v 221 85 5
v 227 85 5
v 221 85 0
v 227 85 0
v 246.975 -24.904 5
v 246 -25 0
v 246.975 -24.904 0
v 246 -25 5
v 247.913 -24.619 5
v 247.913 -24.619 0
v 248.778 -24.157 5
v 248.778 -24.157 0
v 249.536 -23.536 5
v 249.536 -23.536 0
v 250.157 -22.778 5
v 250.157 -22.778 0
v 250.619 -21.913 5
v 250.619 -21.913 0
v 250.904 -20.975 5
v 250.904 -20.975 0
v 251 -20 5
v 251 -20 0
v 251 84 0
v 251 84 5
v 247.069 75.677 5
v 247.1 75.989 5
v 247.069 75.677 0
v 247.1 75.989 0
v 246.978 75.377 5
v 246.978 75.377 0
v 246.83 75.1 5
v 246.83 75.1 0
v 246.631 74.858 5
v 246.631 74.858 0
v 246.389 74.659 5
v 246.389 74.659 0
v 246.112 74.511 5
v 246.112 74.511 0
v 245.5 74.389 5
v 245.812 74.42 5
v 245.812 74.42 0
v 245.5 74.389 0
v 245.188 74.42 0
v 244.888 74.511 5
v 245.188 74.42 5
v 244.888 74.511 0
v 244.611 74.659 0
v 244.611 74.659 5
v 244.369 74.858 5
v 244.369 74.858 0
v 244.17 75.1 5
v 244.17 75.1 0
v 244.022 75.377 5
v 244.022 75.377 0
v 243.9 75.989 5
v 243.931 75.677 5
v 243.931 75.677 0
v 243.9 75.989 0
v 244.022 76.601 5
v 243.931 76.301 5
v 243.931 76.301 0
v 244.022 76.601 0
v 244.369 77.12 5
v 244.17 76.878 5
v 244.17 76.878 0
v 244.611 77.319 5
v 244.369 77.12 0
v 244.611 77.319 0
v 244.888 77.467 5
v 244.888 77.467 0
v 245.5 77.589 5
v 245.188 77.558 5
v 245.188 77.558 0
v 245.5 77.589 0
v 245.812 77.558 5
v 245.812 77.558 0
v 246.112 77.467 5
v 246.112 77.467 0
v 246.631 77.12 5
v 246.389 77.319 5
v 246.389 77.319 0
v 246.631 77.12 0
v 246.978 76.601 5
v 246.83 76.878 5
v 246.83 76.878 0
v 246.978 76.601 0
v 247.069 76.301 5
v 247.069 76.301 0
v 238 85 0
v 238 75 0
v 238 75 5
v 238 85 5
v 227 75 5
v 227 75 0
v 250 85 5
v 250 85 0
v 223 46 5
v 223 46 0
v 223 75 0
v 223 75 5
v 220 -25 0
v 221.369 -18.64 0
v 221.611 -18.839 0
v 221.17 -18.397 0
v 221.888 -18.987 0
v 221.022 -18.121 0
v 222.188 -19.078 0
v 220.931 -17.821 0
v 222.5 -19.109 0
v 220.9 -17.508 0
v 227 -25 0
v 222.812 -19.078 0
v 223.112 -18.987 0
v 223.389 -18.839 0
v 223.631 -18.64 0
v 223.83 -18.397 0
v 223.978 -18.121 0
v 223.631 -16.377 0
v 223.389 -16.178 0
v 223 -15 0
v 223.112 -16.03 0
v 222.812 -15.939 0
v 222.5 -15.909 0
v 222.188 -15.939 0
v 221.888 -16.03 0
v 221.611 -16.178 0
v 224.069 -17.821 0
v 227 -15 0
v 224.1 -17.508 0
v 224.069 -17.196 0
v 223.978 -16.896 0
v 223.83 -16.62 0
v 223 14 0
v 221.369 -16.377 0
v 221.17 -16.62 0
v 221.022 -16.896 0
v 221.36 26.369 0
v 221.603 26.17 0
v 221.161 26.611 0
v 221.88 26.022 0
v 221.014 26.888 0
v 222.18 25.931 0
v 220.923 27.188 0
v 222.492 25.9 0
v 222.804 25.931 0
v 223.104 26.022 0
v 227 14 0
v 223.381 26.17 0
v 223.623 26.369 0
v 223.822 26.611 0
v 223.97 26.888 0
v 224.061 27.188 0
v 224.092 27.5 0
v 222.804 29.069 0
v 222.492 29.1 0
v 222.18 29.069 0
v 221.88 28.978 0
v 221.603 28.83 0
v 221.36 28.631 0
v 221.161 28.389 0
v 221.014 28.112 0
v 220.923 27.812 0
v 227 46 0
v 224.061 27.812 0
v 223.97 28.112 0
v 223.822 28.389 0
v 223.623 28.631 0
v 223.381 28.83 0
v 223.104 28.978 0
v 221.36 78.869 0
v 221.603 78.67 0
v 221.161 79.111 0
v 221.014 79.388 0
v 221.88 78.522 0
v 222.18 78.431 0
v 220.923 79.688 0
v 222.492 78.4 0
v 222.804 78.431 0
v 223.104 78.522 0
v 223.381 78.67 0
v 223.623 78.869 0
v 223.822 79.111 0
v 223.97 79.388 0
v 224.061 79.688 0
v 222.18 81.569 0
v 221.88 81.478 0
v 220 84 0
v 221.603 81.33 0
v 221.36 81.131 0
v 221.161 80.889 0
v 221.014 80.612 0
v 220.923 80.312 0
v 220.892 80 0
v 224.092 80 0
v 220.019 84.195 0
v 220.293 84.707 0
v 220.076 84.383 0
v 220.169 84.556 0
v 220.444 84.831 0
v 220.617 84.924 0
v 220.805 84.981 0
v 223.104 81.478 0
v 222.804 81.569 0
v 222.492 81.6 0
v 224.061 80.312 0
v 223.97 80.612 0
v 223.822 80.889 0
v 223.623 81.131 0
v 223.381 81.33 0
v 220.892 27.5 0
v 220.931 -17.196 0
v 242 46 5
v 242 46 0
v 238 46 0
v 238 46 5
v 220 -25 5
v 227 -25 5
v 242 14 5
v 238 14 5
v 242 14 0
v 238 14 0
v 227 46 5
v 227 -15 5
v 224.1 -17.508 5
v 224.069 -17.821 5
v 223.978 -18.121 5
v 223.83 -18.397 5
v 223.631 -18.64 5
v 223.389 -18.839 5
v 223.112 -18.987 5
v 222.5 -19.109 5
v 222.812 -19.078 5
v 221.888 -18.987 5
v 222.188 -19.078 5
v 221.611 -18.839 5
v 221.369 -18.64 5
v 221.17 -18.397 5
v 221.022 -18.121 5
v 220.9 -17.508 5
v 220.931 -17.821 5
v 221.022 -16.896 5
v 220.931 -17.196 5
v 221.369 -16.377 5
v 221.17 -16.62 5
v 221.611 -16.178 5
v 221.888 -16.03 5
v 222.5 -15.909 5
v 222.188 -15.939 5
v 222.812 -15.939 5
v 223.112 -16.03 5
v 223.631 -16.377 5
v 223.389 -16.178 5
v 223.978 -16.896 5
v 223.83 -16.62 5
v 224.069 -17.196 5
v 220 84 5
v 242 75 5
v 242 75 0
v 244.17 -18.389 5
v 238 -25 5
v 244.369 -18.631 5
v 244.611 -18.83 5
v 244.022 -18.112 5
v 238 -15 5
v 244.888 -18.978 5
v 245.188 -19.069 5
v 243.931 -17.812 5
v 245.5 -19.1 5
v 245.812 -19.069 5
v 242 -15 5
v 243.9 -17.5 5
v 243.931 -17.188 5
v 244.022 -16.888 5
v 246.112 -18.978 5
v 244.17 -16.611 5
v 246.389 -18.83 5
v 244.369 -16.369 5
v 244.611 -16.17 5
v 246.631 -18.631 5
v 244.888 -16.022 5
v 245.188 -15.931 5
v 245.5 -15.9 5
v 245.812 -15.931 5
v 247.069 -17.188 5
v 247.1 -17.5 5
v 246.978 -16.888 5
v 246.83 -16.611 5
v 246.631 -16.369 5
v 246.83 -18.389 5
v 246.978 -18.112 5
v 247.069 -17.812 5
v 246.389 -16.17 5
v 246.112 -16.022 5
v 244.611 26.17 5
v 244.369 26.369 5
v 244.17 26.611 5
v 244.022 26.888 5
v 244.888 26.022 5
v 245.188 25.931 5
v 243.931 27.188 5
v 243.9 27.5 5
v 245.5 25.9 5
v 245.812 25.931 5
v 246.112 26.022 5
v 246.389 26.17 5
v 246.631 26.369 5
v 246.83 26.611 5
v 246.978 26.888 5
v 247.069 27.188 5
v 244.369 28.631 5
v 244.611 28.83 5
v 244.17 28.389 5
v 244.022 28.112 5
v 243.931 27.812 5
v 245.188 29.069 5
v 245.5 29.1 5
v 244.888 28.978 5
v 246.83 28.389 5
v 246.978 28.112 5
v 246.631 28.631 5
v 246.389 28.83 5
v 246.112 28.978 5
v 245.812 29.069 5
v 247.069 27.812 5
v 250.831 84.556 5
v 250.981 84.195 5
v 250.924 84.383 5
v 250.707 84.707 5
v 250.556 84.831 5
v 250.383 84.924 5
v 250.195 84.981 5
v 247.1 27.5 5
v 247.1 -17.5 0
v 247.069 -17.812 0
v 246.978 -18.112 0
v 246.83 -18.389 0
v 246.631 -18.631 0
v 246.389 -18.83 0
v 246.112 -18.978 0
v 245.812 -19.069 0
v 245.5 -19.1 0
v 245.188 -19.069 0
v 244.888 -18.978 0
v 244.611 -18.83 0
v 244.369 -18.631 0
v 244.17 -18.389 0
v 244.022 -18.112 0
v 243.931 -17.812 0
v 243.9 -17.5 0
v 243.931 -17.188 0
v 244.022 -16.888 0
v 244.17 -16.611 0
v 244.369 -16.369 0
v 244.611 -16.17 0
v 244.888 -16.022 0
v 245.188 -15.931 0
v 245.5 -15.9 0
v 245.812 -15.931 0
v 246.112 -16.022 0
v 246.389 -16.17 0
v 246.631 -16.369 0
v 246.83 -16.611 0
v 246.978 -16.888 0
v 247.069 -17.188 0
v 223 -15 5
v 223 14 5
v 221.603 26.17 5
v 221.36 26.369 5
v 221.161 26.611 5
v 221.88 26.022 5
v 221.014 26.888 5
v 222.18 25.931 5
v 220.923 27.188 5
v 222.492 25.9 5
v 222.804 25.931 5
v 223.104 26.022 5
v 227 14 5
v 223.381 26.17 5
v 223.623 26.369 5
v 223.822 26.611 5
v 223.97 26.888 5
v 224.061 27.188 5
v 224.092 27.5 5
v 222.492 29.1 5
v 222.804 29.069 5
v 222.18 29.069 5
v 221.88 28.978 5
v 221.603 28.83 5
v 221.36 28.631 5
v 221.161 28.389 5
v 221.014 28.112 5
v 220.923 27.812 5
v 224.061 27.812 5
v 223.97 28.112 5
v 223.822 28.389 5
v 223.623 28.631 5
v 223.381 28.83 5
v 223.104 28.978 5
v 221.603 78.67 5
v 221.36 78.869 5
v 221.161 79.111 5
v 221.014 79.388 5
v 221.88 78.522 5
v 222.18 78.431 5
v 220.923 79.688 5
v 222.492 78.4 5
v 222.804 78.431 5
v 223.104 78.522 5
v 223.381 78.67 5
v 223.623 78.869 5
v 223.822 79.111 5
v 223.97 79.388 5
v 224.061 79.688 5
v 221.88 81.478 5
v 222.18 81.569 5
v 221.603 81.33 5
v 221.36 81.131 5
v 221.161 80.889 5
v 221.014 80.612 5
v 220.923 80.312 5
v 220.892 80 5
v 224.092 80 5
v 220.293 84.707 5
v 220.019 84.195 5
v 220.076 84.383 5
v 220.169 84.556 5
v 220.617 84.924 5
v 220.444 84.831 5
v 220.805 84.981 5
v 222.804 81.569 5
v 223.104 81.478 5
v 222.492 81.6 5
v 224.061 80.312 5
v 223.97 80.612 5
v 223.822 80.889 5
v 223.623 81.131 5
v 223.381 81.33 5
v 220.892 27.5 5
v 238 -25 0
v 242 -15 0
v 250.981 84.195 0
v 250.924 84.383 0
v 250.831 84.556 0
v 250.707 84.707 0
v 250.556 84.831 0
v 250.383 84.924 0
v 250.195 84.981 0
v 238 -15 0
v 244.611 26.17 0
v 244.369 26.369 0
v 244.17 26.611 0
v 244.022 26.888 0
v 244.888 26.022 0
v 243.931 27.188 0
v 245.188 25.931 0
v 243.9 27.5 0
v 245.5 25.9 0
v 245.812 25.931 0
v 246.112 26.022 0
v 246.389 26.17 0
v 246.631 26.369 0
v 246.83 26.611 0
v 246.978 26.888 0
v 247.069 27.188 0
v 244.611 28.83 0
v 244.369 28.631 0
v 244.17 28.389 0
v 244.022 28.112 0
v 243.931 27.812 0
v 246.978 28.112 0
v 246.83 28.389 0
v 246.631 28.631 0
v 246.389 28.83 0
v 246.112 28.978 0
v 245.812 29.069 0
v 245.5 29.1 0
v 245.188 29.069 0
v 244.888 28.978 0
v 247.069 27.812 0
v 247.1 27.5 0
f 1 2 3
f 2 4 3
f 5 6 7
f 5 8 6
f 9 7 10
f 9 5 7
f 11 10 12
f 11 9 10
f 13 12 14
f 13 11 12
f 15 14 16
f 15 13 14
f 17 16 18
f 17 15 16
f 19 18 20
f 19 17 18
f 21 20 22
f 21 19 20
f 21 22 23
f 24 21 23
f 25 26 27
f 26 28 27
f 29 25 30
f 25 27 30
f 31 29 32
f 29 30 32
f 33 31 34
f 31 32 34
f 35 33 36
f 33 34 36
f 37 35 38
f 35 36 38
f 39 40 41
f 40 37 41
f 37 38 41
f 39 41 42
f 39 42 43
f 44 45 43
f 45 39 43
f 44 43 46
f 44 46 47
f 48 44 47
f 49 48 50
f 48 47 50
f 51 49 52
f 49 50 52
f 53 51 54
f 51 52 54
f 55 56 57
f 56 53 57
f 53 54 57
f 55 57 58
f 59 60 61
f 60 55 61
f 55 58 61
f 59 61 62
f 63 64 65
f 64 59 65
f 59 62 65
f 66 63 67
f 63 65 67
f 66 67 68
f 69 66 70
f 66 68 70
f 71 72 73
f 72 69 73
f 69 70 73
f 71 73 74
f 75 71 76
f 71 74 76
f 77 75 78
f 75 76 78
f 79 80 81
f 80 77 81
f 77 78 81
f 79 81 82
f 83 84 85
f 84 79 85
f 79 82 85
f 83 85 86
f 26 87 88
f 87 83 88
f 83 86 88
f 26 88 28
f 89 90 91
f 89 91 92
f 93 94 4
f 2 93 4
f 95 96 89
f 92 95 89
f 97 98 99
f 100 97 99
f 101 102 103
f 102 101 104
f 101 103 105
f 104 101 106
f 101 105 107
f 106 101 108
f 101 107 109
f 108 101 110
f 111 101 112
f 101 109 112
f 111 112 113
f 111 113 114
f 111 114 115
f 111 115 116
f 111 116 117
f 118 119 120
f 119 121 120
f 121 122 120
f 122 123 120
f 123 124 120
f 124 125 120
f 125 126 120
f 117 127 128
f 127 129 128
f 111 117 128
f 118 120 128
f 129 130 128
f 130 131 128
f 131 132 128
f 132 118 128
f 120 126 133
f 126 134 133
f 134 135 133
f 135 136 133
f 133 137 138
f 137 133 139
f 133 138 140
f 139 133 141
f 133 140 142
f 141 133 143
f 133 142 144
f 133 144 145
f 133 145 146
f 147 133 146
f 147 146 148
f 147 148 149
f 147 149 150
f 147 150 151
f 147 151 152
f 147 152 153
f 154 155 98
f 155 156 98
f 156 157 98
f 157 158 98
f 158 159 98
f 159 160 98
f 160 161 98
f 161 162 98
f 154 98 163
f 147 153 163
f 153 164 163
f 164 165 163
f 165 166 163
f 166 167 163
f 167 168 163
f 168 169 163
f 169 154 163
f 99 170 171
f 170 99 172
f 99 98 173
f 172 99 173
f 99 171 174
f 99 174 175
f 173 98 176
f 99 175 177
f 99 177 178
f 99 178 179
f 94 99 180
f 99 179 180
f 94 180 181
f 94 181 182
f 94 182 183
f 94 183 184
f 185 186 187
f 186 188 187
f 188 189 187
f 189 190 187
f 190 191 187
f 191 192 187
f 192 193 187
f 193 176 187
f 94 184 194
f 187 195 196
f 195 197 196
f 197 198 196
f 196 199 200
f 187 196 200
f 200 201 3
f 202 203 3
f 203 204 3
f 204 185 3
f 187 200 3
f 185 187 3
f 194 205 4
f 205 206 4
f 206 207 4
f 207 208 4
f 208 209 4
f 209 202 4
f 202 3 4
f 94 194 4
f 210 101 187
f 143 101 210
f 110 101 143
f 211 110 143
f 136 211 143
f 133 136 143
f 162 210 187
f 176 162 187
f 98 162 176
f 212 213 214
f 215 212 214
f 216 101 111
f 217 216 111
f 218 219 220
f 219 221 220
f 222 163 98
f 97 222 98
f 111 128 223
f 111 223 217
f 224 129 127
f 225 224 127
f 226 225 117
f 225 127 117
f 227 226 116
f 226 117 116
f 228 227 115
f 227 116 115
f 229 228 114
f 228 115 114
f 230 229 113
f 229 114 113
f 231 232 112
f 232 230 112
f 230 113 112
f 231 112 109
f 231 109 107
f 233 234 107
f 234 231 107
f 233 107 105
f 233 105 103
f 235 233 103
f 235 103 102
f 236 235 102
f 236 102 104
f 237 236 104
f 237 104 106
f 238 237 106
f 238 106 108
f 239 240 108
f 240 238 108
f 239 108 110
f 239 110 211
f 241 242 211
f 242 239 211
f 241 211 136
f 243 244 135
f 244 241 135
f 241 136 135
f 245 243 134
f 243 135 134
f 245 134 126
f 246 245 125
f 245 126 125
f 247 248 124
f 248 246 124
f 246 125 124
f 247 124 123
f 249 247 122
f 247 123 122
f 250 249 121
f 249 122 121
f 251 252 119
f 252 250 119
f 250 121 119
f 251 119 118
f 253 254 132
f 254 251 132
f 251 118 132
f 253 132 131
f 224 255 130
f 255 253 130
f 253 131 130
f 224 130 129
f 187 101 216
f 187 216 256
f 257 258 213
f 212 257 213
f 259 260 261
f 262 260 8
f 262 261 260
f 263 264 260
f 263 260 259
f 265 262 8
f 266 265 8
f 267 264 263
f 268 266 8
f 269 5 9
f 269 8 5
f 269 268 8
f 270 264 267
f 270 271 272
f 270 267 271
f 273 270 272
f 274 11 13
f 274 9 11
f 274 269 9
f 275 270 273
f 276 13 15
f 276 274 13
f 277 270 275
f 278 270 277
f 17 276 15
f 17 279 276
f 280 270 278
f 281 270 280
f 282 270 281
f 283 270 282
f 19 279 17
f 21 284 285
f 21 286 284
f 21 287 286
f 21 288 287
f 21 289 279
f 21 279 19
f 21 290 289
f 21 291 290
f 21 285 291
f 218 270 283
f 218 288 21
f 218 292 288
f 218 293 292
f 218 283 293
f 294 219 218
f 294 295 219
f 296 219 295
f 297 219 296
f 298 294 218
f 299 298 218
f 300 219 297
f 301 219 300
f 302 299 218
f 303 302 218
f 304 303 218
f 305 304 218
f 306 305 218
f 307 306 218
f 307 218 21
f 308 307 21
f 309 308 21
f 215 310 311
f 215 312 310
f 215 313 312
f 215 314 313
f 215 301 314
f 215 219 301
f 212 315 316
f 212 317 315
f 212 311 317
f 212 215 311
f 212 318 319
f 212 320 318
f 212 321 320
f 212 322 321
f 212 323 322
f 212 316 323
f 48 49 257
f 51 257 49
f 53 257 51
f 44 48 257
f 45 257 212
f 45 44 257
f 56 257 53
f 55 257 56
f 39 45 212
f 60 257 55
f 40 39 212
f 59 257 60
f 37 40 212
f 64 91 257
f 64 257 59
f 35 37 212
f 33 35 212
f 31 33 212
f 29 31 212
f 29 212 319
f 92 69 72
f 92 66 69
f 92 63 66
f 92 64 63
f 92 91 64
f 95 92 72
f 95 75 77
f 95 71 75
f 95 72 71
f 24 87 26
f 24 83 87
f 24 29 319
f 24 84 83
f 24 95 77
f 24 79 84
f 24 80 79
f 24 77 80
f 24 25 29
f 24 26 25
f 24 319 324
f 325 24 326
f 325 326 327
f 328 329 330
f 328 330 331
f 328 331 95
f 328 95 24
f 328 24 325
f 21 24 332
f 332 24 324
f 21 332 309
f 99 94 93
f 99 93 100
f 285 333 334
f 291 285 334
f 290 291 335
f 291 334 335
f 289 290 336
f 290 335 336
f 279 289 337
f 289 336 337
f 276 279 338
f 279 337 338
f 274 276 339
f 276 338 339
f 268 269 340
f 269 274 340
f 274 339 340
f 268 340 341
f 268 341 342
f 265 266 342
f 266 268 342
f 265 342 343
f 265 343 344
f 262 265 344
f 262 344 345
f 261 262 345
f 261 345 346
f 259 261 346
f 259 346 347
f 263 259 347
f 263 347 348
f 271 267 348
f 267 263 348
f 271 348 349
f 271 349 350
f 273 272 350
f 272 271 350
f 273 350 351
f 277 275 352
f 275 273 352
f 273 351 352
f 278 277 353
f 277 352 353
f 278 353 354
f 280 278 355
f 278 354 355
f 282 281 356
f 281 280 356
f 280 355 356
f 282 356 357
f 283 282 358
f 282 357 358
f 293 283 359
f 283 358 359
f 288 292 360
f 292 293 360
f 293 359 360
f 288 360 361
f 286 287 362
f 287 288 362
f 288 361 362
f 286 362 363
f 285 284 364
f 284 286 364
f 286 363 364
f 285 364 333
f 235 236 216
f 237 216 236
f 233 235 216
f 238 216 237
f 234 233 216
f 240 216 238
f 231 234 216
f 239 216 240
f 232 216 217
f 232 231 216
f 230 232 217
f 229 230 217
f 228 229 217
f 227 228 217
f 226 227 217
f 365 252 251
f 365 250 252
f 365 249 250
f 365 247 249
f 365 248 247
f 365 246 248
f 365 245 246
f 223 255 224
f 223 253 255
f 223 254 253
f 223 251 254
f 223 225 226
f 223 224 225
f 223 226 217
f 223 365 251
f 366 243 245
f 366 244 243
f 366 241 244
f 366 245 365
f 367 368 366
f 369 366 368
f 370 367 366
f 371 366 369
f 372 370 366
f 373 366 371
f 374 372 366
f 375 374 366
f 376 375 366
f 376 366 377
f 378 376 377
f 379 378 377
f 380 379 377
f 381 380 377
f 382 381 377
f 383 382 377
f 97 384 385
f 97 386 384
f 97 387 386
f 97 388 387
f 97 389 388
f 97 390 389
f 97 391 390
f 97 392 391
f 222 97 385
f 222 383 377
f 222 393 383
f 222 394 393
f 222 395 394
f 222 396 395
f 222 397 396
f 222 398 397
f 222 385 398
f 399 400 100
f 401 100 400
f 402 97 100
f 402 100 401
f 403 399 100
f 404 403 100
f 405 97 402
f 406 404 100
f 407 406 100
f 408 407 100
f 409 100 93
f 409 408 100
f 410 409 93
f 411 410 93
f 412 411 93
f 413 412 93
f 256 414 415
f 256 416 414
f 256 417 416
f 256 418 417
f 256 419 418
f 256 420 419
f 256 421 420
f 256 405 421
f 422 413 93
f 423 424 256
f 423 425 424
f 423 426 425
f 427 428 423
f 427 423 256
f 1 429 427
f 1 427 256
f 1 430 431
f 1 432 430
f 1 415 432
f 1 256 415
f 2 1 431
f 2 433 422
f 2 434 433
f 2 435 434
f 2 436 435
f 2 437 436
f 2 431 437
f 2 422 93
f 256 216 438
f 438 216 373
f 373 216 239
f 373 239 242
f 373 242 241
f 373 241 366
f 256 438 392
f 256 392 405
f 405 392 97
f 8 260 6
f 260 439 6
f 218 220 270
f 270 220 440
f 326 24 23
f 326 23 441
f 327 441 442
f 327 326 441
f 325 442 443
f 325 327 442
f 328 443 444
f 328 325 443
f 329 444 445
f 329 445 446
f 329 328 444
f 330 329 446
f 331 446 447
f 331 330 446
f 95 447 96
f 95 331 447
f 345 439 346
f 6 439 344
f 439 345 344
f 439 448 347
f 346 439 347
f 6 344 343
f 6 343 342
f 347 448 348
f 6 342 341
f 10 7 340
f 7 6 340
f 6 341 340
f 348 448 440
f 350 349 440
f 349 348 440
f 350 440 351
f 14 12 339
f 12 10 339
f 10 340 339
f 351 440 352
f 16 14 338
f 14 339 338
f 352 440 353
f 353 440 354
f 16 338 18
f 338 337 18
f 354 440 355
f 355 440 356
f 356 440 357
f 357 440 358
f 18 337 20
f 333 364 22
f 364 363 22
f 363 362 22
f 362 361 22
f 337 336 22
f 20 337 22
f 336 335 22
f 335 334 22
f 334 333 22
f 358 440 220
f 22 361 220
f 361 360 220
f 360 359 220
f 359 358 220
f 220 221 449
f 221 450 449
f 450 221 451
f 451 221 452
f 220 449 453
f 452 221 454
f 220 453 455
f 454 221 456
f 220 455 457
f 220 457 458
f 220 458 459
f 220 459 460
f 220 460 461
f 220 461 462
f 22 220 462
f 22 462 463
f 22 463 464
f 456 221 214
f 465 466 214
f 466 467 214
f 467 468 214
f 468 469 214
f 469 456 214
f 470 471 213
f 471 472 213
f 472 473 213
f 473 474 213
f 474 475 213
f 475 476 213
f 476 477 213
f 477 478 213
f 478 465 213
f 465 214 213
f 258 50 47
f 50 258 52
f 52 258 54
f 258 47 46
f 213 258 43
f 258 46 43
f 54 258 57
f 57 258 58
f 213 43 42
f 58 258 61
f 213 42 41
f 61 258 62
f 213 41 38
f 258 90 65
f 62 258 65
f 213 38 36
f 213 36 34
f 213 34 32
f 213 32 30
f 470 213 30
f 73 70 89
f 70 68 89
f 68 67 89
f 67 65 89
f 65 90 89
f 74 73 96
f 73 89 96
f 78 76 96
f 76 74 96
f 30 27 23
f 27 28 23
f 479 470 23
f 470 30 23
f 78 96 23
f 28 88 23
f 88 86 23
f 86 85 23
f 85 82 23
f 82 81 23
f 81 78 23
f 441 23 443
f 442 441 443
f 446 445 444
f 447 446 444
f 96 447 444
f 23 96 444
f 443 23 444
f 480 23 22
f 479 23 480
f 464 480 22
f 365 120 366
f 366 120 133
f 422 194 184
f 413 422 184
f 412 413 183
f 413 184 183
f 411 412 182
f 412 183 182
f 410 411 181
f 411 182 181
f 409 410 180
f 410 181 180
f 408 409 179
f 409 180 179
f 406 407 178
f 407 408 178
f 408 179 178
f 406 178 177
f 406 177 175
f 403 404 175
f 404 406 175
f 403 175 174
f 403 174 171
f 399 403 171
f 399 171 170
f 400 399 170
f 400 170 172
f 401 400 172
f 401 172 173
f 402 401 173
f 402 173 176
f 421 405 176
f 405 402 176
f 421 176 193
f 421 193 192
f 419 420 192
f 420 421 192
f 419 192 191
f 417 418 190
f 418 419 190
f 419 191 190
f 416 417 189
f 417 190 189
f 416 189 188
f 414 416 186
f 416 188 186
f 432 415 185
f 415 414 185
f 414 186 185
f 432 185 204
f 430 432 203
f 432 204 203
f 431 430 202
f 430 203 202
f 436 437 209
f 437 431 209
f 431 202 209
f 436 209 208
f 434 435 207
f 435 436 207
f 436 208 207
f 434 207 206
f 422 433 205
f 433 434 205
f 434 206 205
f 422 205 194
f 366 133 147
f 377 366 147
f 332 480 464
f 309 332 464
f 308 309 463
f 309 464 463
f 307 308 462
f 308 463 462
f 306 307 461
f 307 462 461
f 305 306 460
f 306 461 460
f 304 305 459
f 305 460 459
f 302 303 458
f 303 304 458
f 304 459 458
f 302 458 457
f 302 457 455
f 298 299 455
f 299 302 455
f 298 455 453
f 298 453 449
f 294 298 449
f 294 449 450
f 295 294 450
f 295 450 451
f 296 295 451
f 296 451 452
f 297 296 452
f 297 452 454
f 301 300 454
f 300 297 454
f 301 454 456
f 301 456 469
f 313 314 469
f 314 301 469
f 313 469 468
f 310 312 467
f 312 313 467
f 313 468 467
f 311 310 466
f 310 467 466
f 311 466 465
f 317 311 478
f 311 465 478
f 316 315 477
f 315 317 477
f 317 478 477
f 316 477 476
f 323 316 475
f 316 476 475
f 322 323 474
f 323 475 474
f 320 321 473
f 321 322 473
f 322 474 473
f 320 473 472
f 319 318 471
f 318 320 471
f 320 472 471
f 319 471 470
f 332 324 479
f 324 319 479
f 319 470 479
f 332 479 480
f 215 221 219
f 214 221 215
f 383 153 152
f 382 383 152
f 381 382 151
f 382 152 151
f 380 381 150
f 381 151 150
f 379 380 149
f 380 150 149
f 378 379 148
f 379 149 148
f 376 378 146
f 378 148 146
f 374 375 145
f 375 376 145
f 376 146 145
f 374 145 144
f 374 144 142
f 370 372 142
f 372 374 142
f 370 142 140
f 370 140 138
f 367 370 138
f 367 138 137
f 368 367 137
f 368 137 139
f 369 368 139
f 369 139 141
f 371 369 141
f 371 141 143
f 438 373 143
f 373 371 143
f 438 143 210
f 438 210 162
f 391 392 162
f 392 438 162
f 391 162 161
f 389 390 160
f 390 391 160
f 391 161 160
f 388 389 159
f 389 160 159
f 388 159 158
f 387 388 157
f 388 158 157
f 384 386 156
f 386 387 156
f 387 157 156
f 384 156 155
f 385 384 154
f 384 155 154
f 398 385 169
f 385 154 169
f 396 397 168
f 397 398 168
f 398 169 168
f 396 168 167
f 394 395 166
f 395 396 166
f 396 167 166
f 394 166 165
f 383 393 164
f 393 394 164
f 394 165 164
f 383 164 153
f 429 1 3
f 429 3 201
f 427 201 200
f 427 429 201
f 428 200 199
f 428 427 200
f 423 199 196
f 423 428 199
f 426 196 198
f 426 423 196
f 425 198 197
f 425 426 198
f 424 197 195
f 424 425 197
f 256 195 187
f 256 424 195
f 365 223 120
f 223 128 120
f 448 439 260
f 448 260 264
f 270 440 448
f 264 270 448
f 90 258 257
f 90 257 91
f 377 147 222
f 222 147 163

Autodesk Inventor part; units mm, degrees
ref_plane "YZ Plane" through (0, 0, 0) normal (1, 0, 0) x (0, 1, 0)
ref_plane "XZ Plane" through (0, 0, 0) normal (0, 1, 0) x (-1, 0, 0)
ref_plane "XY Plane" through (0, 0, 0) normal (0, 0, 1) x (1, 0, 0)
sketch "Boceto1" plane through (0, 0, 0) normal (0, 0, 1) x (1, 0, 0)
  line L0 (220, 79) -> (220, 30)
  circle A0 centre (222.5, -17.5085) radius 1.6
  circle A1 centre (222.4918, 27.5) radius 1.6
  circle A2 centre (245.5, 27.5) radius 1.6
  circle A3 centre (245.5, -17.5) radius 1.6
  circle A4 centre (222.4918, 80) radius 1.6
  circle A5 centre (245.5, 75.9891) radius 1.6
  line L1 (220, 30) -> (220, -25)
  line L2 (238, 75) -> (238, 80)
  line L3 (227, 80) -> (227, 75)
  line L4 (220, -25) -> (227, -25)
  line L5 (238, -25) -> (240, -25)
  line L6 (239.9, -15) -> (238, -15)
  line L7 (227, -15) -> (225.1, -15)
  line L8 (227, 41) -> (227, 14)
  line L9 (227, -15) -> (227, -25)
  line L10 (238, -25) -> (238, -15)
  line L11 (238, 14) -> (238, 41)
  line L12 (225.1, 14) -> (227, 14)
  line L13 (238, 14) -> (239.9, 14)
  line L14 (225.1, -15) -> (223, -15)
  line L15 (239.9, -15) -> (242, -15)
  line L16 (225.1, 14) -> (223, 14)
  line L17 (239.9, 14) -> (242, 14)
  line L18 (223, 46) -> (223, 70)
  line L19 (242, 70) -> (242, 46)
  line L20 (223, -15) -> (223, 14)
  line L21 (242, 14) -> (242, -15)
  line L22 (251, 80) -> (251, -25)
  line L23 (240, -25) -> (251, -25)
  line L24 (220, 79) -> (220, 85)
  line L25 (227, 80) -> (227, 85)
  line L26 (238, 80) -> (238, 85)
  line L27 (251, 80) -> (251, 85)
  line L28 (251, 85) -> (238, 85)
  line L29 (227, 85) -> (220, 85)
  line L30 (227, 41) -> (227, 46)
  line L31 (238, 41) -> (238, 46)
  line L32 (242, 46) -> (238, 46)
  line L33 (227, 46) -> (223, 46)
  line L34 (223, 70) -> (223, 75)
  line L35 (242, 70) -> (242, 75)
  line L36 (242, 75) -> (238, 75)
  line L37 (227, 75) -> (223, 75)
  dimension "d6" = 7
  dimension "d17" = 7.5
  dimension "d18" = 5
  dimension "d21" = 7.5
  dimension "d22" = 7.5
  dimension "d23" = 4.5082
  dimension "d24" = 4.5
extrude "Extrusión1" add sketch "Boceto1" along normal blind 5
fillet "Empalme2" radius 5 1 edges at (251, -25, 2.5)
fillet "Empalme3" radius 1 1 edges at (251, 85, 2.5)
fillet "Empalme4" radius 1 1 edges at (220, 85, 2.5)
properties part number "suplemento cojinete"
